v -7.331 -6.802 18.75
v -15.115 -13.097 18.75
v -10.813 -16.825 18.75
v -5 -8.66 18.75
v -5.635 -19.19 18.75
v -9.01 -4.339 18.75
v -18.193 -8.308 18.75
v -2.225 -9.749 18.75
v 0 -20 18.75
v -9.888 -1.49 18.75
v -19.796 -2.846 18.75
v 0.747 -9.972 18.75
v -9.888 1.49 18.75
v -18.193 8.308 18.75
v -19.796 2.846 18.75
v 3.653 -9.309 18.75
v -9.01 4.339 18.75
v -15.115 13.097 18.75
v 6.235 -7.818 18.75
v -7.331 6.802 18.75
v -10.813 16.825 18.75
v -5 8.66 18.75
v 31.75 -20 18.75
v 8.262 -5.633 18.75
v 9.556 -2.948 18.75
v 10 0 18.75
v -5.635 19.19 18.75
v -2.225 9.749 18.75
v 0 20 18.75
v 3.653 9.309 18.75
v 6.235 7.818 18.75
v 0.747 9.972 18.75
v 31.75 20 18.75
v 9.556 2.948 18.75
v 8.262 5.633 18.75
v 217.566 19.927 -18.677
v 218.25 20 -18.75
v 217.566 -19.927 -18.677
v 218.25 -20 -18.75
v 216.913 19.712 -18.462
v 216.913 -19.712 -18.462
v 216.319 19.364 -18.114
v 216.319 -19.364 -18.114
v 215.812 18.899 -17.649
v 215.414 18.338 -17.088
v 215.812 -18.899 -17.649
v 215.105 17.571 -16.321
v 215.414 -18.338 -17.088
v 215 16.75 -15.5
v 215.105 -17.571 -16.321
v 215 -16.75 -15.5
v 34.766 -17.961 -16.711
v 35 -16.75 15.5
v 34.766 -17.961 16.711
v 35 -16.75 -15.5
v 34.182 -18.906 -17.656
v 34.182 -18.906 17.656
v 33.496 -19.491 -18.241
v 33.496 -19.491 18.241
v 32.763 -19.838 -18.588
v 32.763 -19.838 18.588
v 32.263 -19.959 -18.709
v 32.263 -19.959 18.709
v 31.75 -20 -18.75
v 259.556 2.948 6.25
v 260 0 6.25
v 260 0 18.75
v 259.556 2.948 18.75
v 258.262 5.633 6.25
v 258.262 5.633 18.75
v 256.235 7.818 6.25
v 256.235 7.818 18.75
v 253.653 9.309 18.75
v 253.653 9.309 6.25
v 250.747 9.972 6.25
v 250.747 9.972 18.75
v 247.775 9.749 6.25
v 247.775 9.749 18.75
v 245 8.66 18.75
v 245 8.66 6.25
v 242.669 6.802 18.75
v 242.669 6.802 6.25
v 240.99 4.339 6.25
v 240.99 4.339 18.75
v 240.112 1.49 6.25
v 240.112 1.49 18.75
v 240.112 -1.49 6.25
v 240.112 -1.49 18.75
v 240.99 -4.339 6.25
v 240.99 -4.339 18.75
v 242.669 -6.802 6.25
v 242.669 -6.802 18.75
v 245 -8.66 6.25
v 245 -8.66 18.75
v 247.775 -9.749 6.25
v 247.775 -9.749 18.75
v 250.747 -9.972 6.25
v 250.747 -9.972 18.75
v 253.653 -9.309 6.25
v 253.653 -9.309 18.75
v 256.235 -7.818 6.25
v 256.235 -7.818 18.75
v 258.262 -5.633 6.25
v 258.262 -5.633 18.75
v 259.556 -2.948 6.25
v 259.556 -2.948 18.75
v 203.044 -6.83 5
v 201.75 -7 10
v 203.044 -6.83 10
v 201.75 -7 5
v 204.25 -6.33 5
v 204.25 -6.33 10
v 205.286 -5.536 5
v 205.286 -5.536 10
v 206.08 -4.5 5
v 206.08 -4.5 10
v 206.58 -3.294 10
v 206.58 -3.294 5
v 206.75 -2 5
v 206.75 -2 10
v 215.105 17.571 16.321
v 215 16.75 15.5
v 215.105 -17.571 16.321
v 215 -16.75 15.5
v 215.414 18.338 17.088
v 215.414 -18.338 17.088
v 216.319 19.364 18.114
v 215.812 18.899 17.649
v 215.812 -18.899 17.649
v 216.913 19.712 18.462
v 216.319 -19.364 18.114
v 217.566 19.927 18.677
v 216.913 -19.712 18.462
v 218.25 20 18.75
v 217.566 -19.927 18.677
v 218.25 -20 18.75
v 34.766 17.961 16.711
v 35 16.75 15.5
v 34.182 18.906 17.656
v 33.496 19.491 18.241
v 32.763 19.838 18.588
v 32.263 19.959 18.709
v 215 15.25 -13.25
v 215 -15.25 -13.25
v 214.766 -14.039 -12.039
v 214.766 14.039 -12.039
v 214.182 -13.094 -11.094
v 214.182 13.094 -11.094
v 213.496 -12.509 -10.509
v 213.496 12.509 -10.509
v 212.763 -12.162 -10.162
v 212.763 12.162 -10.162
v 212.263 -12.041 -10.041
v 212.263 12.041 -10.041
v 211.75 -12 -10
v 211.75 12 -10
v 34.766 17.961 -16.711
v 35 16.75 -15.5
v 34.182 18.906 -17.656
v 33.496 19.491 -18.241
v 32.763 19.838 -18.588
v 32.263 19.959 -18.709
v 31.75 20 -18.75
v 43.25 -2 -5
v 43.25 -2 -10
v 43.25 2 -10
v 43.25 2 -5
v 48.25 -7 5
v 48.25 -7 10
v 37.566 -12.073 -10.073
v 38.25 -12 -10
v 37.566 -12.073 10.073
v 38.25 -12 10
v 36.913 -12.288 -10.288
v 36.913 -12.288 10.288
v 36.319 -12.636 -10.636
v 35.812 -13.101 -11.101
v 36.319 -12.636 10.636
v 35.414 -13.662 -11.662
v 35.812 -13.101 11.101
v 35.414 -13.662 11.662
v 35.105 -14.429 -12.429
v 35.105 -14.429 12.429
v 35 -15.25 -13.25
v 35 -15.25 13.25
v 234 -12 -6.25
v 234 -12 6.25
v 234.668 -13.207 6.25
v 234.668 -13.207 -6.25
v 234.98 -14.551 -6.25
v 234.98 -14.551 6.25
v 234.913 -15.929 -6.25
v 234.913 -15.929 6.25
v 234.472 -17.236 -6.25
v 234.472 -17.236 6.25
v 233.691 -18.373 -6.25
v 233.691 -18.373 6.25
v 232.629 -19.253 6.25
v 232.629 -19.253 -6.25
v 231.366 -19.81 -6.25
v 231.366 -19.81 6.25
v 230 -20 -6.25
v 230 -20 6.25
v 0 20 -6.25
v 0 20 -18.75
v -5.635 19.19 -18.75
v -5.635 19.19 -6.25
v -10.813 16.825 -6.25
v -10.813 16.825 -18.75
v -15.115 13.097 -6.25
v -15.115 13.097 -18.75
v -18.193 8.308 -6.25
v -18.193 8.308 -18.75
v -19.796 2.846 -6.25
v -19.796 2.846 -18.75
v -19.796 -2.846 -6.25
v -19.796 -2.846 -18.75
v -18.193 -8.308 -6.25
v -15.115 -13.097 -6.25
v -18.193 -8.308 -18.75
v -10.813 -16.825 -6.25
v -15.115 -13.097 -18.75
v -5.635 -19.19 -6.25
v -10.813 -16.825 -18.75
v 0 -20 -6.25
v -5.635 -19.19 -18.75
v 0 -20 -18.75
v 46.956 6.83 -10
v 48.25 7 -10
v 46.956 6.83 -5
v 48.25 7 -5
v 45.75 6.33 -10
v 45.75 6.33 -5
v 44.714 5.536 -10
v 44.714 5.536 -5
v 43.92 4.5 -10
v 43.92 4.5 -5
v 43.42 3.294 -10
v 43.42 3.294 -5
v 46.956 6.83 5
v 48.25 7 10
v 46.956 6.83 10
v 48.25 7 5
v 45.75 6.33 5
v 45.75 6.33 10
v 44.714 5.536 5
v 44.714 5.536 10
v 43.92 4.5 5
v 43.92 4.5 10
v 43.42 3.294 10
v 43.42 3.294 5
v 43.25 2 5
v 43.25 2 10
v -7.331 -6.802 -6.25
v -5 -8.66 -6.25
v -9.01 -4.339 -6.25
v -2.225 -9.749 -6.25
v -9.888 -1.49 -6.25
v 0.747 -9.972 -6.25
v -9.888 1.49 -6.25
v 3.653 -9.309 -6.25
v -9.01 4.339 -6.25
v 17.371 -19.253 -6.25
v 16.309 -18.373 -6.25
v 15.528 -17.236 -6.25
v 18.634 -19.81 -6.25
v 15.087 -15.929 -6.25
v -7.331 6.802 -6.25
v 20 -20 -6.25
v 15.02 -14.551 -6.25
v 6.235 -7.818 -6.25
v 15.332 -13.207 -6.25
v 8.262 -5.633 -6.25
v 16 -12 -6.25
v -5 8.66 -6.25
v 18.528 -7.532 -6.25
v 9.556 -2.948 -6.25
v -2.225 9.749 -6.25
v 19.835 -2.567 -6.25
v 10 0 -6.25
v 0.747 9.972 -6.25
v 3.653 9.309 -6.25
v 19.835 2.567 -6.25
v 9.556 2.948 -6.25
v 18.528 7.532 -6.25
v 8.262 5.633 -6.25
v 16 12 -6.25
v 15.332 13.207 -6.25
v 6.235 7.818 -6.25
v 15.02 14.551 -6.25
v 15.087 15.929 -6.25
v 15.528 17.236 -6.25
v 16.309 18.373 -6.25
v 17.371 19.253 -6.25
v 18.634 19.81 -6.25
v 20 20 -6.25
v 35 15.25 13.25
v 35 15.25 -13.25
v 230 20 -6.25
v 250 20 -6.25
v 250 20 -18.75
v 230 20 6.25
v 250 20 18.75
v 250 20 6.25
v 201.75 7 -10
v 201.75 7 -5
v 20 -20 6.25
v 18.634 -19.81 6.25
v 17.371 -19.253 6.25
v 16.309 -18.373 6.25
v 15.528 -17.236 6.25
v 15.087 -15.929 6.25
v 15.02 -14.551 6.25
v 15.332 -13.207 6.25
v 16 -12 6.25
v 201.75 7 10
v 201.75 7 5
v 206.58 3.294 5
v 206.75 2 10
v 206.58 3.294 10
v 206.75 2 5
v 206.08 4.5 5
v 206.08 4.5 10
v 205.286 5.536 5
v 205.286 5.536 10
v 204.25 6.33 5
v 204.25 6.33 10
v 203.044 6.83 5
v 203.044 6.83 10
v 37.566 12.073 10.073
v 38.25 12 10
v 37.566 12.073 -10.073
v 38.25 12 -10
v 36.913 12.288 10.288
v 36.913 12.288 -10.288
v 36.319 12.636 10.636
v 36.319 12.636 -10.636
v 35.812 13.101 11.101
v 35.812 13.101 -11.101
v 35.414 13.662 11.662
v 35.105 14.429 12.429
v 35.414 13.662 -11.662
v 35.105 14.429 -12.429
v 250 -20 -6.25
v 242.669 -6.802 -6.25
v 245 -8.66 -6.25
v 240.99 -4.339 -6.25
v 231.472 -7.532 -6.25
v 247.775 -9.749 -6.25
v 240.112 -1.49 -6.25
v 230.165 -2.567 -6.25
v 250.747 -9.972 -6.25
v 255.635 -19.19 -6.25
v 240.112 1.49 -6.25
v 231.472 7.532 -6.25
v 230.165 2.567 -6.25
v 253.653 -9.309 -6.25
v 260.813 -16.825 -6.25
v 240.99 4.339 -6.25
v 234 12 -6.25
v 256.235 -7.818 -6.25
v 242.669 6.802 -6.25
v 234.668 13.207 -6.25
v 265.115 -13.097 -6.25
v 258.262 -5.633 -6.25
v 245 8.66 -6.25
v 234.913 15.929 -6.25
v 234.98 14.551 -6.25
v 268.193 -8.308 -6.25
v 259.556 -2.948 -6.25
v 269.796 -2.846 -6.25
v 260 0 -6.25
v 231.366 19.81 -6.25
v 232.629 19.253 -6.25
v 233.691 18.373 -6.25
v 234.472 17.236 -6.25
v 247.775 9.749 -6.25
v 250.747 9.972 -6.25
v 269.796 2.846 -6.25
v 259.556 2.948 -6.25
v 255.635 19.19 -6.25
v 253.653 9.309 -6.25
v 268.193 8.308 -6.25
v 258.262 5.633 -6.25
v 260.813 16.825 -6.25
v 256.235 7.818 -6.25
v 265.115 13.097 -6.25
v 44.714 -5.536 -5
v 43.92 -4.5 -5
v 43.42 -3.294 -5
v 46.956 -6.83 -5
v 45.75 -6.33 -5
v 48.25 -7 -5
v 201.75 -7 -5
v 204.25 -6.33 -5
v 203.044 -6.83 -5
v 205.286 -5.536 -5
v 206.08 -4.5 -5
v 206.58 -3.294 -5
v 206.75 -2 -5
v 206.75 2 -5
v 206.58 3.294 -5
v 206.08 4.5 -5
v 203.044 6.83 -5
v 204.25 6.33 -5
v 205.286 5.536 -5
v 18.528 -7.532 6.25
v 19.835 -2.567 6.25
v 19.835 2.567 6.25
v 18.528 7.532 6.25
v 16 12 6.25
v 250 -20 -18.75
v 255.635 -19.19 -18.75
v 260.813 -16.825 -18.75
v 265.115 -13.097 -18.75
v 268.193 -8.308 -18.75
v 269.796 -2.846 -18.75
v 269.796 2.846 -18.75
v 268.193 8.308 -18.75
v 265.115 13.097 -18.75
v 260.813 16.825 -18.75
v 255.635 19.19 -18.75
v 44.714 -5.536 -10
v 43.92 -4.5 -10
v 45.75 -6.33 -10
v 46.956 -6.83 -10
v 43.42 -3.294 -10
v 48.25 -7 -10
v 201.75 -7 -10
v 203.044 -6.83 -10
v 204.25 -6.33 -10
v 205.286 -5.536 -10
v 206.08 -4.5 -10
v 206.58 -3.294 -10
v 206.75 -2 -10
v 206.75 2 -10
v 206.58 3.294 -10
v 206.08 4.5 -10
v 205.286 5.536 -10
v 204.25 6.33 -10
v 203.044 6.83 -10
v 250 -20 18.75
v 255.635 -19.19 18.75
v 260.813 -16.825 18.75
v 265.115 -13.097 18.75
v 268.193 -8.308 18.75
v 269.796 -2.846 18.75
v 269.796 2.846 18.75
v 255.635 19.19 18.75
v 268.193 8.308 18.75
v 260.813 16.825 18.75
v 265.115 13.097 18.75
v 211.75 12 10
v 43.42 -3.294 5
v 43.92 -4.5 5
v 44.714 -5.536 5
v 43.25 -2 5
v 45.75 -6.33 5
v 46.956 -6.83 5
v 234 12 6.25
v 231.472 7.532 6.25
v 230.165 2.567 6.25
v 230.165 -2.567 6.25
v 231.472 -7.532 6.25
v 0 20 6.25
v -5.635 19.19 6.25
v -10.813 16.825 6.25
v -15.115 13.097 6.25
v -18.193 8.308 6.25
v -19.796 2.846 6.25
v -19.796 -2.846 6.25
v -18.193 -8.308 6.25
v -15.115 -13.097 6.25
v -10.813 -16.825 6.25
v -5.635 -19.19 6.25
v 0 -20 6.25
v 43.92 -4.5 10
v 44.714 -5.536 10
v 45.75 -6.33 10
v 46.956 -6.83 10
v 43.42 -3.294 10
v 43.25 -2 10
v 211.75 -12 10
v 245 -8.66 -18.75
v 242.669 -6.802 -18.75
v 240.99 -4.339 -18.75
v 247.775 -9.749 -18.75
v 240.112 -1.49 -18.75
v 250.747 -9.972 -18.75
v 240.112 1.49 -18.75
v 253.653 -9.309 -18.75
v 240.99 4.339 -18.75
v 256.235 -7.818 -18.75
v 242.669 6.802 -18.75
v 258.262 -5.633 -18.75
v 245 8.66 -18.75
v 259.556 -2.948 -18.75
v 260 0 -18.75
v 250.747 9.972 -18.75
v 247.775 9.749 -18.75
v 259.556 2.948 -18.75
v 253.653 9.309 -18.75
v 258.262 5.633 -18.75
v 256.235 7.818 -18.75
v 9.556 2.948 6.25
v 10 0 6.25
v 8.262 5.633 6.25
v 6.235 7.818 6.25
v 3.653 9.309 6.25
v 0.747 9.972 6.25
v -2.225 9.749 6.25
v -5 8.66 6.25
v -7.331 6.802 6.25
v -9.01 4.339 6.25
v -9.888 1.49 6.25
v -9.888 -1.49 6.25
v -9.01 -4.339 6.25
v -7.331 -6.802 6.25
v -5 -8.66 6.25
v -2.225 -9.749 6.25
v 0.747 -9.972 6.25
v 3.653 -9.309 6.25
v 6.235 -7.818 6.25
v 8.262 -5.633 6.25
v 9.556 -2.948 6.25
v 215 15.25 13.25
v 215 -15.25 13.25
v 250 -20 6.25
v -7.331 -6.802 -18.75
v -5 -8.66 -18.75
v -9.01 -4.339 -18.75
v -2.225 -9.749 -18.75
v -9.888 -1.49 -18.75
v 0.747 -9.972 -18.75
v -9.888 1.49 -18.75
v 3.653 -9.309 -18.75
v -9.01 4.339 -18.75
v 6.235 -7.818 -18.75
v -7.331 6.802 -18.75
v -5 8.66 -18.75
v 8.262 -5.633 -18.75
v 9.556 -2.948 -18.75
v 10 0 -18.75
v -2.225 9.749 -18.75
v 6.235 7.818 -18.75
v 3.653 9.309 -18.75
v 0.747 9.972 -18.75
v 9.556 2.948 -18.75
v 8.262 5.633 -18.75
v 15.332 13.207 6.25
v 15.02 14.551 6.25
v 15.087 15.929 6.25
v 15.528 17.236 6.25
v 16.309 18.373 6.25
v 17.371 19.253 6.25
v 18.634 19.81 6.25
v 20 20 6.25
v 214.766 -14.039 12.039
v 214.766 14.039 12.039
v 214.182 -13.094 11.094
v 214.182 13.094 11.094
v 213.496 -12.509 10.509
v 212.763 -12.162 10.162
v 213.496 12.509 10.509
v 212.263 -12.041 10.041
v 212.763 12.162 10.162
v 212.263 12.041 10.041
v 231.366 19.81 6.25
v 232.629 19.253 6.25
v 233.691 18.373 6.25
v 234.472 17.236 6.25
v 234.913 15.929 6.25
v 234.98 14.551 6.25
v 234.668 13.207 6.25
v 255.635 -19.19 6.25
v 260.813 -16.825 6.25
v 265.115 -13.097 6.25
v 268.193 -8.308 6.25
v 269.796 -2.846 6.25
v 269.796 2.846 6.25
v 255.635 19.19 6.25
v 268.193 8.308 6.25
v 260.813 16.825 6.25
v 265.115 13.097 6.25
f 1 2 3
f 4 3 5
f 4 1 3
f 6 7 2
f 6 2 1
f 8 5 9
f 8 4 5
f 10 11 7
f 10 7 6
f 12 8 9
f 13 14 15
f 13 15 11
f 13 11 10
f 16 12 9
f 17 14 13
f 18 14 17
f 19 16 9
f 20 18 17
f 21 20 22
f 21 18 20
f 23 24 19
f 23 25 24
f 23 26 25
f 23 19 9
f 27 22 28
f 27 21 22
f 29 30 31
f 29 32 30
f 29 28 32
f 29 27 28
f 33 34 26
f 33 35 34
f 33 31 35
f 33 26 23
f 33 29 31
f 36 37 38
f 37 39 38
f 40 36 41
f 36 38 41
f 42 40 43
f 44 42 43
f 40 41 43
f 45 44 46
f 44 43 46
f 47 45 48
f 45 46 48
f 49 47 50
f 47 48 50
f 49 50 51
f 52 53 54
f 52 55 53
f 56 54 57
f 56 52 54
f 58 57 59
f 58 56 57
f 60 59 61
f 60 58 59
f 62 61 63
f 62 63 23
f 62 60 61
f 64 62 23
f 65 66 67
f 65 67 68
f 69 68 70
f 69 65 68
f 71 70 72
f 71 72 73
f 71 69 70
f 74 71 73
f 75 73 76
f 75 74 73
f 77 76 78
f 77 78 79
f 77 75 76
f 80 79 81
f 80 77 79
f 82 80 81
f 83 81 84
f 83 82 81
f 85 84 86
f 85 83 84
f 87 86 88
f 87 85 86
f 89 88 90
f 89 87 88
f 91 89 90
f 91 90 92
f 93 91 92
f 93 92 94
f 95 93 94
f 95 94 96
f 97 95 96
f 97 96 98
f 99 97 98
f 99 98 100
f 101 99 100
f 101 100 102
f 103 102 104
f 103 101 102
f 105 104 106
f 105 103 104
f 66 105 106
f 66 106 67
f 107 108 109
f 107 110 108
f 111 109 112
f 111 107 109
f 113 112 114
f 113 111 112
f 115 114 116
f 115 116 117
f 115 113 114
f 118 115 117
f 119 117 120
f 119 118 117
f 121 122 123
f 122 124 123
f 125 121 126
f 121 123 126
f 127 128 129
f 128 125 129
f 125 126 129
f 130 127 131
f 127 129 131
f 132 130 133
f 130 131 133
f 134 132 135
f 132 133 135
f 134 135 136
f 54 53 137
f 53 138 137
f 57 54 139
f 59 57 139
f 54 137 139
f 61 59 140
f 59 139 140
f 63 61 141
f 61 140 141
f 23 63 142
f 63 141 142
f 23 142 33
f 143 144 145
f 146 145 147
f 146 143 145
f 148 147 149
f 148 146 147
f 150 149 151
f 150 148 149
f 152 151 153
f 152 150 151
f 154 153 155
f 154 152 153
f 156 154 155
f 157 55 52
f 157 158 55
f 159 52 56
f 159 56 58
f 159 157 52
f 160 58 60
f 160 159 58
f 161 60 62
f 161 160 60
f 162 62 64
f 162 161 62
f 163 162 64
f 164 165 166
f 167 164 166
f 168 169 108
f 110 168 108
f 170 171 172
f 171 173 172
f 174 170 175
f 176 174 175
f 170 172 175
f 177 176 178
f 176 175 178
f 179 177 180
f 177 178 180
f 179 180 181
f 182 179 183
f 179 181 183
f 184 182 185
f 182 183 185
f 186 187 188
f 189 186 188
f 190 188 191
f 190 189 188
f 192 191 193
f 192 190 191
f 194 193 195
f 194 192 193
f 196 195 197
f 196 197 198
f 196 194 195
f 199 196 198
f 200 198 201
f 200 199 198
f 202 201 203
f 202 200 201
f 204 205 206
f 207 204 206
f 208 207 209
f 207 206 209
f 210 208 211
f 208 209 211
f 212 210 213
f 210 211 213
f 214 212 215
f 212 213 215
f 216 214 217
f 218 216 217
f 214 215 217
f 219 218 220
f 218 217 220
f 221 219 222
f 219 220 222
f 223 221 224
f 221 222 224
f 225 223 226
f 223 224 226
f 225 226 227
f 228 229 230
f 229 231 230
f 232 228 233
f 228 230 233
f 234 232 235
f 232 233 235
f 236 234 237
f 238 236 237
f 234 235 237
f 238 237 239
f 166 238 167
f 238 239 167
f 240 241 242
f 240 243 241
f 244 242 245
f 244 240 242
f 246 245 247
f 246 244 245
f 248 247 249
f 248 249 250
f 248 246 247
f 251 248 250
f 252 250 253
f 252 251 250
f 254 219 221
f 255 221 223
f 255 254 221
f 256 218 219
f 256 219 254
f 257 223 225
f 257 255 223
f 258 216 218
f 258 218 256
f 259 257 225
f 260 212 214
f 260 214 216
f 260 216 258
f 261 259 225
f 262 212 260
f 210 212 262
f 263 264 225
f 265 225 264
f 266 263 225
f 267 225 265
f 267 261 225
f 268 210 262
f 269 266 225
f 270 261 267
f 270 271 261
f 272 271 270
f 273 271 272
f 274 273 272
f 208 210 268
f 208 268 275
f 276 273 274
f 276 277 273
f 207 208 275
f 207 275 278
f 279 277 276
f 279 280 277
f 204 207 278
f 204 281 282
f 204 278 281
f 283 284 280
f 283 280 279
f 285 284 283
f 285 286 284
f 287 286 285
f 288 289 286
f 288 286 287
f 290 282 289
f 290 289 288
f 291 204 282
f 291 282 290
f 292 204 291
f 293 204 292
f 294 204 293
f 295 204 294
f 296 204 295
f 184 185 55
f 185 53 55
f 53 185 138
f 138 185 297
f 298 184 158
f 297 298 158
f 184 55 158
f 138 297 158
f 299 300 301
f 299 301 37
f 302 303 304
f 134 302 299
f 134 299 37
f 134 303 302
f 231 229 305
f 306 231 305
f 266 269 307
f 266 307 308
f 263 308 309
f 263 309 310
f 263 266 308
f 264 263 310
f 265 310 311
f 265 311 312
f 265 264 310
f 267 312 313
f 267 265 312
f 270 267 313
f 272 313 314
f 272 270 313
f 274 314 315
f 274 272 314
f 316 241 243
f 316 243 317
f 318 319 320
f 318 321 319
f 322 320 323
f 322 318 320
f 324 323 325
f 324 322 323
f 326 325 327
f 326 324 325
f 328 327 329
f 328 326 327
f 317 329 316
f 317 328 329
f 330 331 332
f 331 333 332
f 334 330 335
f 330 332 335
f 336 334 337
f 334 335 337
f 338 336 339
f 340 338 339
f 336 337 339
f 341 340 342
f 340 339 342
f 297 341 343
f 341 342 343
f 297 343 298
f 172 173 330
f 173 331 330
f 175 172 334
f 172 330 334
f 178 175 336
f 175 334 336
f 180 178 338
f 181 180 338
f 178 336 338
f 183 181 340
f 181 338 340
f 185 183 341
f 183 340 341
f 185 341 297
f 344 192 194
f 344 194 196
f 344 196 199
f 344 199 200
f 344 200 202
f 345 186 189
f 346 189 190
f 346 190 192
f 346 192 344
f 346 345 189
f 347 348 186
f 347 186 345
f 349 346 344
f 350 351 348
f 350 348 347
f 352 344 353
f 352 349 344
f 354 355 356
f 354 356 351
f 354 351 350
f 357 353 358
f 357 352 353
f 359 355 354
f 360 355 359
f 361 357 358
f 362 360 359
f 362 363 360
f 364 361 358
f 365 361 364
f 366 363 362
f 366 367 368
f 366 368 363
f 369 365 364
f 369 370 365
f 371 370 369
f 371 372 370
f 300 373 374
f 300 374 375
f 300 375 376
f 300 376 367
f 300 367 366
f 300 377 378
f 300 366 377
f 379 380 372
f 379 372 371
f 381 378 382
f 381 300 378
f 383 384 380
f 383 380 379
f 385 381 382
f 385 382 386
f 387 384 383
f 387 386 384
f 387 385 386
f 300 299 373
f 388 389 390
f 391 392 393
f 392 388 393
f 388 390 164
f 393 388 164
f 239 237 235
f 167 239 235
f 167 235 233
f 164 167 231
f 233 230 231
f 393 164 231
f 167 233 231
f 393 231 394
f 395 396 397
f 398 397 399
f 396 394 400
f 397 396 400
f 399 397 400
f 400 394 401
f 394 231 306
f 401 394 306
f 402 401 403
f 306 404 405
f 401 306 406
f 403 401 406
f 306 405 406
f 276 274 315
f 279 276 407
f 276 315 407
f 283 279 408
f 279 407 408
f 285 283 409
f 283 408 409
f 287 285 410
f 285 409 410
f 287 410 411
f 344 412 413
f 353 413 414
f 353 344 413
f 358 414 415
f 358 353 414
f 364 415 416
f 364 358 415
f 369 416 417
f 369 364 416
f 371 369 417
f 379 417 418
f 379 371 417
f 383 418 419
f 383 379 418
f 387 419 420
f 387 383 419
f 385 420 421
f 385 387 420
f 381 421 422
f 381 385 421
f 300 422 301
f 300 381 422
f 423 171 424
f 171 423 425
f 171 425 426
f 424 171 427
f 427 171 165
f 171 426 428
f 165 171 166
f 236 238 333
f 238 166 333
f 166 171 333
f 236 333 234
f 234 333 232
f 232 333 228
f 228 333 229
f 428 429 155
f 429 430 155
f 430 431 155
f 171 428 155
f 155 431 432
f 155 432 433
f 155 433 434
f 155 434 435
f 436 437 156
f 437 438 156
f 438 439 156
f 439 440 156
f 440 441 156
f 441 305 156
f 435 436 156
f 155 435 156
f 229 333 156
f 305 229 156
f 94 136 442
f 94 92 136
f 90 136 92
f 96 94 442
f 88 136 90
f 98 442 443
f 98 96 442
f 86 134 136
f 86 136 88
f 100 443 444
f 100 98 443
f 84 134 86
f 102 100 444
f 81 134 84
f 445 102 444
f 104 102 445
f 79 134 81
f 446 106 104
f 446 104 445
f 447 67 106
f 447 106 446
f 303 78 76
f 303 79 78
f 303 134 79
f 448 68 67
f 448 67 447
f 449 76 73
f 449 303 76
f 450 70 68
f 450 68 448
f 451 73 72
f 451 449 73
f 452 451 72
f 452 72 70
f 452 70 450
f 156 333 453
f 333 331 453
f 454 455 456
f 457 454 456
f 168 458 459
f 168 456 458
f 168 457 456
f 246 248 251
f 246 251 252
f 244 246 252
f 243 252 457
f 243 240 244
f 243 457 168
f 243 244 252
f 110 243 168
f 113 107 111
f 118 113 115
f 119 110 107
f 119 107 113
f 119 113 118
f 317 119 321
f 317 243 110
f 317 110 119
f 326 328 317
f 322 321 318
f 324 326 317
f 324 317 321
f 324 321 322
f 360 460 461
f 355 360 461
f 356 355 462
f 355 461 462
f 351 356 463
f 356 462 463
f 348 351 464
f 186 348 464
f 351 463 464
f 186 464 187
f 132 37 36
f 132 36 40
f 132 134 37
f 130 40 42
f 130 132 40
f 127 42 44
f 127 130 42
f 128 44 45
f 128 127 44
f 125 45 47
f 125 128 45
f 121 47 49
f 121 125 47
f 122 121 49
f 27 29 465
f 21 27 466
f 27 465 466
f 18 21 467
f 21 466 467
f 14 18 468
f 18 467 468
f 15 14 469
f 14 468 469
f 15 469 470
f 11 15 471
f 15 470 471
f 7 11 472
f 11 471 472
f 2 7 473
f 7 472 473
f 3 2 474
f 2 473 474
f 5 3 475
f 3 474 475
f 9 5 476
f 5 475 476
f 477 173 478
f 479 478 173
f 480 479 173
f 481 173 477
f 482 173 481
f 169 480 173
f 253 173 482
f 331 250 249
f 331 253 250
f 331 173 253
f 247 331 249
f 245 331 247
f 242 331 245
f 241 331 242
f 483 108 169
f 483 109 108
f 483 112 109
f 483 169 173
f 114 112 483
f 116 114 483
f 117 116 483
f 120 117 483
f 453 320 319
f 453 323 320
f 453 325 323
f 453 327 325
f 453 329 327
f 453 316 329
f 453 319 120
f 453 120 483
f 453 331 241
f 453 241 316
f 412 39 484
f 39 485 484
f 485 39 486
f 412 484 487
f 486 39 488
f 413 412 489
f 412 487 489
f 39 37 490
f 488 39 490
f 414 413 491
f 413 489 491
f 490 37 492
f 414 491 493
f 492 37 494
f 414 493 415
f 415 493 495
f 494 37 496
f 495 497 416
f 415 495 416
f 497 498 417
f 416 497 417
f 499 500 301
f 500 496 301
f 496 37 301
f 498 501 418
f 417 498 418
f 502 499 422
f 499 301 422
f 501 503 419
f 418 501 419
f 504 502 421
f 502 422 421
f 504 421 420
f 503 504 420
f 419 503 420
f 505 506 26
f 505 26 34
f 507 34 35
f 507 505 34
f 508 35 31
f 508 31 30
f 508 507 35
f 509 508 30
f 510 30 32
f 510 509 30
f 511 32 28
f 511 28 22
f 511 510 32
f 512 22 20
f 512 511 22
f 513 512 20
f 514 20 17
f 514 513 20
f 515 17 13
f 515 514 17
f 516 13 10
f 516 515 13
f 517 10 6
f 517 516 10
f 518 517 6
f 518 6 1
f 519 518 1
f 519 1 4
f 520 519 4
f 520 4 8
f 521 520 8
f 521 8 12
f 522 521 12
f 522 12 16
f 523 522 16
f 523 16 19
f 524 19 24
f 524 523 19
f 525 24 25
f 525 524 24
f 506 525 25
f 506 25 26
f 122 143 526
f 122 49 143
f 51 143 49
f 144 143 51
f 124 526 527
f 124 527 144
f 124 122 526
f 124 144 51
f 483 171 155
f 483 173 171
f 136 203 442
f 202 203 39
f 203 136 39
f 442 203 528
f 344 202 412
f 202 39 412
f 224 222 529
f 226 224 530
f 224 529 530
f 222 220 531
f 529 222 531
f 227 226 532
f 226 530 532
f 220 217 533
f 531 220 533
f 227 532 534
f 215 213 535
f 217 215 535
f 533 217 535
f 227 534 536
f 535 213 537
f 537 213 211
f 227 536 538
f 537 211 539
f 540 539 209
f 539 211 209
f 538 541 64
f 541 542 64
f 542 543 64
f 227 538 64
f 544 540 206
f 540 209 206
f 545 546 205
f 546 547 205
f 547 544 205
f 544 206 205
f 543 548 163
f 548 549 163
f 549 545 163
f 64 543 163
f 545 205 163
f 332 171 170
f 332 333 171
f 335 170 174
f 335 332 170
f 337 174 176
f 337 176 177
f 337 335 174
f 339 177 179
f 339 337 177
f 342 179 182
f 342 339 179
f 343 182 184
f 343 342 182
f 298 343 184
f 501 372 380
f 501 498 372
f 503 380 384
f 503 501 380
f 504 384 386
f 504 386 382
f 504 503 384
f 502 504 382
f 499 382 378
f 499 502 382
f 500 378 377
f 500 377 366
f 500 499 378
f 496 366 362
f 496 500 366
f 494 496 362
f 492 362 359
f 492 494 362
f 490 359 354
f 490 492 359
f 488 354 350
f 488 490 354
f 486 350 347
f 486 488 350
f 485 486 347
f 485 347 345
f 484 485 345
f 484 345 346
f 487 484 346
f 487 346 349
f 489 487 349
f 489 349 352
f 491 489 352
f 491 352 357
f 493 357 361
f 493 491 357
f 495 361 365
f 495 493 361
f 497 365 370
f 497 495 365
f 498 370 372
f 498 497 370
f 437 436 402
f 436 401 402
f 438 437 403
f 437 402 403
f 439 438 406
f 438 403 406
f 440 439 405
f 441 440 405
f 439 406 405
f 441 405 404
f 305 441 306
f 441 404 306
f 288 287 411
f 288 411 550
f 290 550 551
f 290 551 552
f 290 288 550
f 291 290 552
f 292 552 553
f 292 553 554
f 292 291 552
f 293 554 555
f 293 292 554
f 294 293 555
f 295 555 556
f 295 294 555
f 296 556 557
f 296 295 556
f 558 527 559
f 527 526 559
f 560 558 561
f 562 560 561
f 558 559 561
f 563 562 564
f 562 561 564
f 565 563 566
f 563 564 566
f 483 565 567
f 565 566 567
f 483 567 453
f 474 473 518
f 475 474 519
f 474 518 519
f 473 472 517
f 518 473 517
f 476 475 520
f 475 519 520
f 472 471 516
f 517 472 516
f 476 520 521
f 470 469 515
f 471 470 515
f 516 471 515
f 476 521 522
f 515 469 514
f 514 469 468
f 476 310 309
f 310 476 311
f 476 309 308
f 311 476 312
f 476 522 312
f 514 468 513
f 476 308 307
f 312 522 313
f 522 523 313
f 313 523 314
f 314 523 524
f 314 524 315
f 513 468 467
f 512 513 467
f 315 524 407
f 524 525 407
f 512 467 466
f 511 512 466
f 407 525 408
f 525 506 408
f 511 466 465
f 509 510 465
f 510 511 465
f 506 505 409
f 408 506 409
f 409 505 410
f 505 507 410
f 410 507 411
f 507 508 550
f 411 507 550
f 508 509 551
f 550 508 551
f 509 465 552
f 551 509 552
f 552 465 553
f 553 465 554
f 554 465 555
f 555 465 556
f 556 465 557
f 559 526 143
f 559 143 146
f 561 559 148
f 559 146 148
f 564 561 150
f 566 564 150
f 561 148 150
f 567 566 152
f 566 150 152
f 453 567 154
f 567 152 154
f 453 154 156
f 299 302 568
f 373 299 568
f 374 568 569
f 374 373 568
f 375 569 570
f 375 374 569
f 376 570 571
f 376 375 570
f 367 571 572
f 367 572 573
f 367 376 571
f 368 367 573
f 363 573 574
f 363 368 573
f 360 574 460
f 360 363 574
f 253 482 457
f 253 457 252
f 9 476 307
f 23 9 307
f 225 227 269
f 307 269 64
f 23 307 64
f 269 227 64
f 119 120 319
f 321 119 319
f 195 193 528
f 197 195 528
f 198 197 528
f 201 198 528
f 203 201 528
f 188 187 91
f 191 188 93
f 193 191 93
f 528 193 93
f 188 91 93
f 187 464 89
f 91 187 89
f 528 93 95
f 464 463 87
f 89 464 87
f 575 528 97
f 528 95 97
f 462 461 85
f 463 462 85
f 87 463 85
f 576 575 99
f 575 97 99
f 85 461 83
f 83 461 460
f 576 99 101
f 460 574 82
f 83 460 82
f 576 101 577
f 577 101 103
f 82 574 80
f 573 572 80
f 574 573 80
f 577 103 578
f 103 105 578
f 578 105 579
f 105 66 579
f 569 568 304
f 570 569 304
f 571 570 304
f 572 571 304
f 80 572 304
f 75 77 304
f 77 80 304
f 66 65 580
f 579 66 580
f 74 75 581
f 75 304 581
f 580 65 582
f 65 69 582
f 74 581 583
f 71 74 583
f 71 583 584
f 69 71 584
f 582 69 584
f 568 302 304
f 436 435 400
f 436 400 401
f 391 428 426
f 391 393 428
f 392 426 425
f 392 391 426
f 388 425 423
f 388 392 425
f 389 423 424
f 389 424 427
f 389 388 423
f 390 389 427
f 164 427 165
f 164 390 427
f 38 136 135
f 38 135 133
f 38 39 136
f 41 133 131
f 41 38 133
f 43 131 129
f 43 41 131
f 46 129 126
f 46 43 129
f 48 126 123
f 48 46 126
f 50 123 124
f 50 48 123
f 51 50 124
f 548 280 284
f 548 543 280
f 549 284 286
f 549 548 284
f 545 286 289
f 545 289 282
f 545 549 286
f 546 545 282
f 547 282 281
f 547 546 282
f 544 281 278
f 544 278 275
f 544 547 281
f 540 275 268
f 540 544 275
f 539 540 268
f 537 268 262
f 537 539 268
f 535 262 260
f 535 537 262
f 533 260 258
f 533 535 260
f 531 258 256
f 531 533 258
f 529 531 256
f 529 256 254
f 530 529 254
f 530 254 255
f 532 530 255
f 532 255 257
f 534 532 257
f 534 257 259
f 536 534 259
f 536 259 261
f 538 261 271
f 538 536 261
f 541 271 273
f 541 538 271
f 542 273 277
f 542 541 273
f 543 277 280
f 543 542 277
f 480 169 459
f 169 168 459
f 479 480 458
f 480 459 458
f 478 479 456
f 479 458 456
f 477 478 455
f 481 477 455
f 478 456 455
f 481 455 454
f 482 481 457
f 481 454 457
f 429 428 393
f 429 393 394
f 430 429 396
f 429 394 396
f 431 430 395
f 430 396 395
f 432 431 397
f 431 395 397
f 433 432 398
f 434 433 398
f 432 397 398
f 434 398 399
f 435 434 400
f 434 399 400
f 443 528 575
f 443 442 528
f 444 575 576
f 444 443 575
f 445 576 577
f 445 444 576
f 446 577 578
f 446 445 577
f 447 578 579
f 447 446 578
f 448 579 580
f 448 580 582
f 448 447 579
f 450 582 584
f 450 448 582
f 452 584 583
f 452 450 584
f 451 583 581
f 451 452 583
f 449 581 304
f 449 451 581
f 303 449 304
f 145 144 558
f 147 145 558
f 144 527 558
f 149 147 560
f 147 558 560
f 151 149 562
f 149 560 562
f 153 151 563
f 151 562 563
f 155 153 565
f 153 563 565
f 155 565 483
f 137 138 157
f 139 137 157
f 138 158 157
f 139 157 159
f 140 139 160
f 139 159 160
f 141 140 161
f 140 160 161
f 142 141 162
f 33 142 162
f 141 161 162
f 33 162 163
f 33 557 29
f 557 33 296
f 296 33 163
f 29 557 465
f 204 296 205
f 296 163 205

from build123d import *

# Parameters (mm, degrees)
SKETCH1_W            = 180
SKETCH1_H            = 24
BOSS_EXTRUDE3_DEPTH  = 10
SKETCH1_6_R          = 20
SKETCH1_6_R_2        = 10
HEAD_WIDTH_DEPTH     = 18.75
SKETCH1_7_R          = 20
SKETCH1_7_R_2        = 10
CUT_EXTRUDE1_DEPTH   = 6.25
FILLET1_START        = -6.25
FILLET1_DEPTH        = 12.5
FILLET2_R            = 3.25
SKETCH2_W            = 163.5
SKETCH2_H            = 14
CUT_EXTRUDE2_DEPTH   = 5
FILLET3_R            = 5
FILLET3_OF_MIRROR1_R = 5


with BuildPart() as part:
    # Sketch1 → Boss-Extrude3 (new, symmetric)
    with BuildSketch(Plane.XY):
        with Locations((125, 0)):
            Rectangle(SKETCH1_W, SKETCH1_H)
    extrude(amount=BOSS_EXTRUDE3_DEPTH, both=True)

    # Sketch1<6> → Head Width (add, symmetric)
    # profile 1 of 4: a face of its own
    with BuildSketch(Plane.XY):
        with BuildLine():
            Line((35, -12), (35, 12))
            Line((35, 12), (35, 20))
            Line((35, 20), (0, 20))
            ThreePointArc((0, 20), (14.142135624, 14.142135624), (20, 0))
            ThreePointArc((20, 0), (14.142135624, -14.142135624), (0, -20))
            Line((0, -20), (35, -20))
            Line((35, -20), (35, -12))
        make_face()
    # profile 2 of 4: a face of its own
    with BuildSketch(Plane.XY):
        Circle(SKETCH1_6_R)
        Circle(SKETCH1_6_R_2, mode=Mode.SUBTRACT)
    # profile 3 of 4: a face of its own
    with BuildSketch(Plane.XY):
        with BuildLine():
            Line((215, 20), (215, 12))
            Line((215, 12), (215, -12))
            Line((215, -12), (215, -20))
            Line((215, -20), (250, -20))
            ThreePointArc((250, -20), (230, 0), (250, 20))
            Line((250, 20), (215, 20))
        make_face()
    # profile 4 of 4: a face of its own
    with BuildSketch(Plane.XY):
        with Locations((250, 0)):
            Circle(SKETCH1_6_R)
        with Locations((250, 0)):
            Circle(SKETCH1_6_R_2, mode=Mode.SUBTRACT)
    extrude(amount=HEAD_WIDTH_DEPTH, both=True)

    # Sketch1<7> → Cut-Extrude1 (cut, symmetric)
    # profile 1 of 2: a face of its own
    with BuildSketch(Plane.XY):
        Circle(SKETCH1_7_R)
        Circle(SKETCH1_7_R_2, mode=Mode.SUBTRACT)
    # profile 2 of 2: a face of its own
    with BuildSketch(Plane.XY):
        with Locations((250, 0)):
            Circle(SKETCH1_7_R)
        with Locations((250, 0)):
            Circle(SKETCH1_7_R_2, mode=Mode.SUBTRACT)
    extrude(amount=CUT_EXTRUDE1_DEPTH, both=True, mode=Mode.SUBTRACT)

    # Fillet1: read off the stored shape, not the designer's step
    # Fillet1 outline → Fillet1 (cut)
    with BuildSketch(Plane.XY.offset(FILLET1_START)):
        with BuildLine():
            ThreePointArc((230, 20), (234.472135955, 17.236067977), (234, 12))
            ThreePointArc((234, 12), (241.05572809, 17.88854382), (250, 20))
            Line((250, 20), (230, 20))
        make_face()
        with BuildLine():
            ThreePointArc((234, -12), (234.472135955, -17.236067977), (230, -20))
            Line((230, -20), (250, -20))
            ThreePointArc((250, -20), (241.05572809, -17.88854382), (234, -12))
        make_face()
        with BuildLine():
            ThreePointArc((20, -20), (15.527864045, -17.236067977), (16, -12))
            ThreePointArc((16, -12), (8.94427191, -17.88854382), (0, -20))
            Line((0, -20), (20, -20))
        make_face()
        with BuildLine():
            ThreePointArc((0, 20), (8.94427191, 17.88854382), (16, 12))
            ThreePointArc((16, 12), (15.527864045, 17.236067977), (20, 20))
            Line((20, 20), (0, 20))
        make_face()
    extrude(amount=FILLET1_DEPTH, mode=Mode.SUBTRACT)

    # Fillet2
    fillet2_edges = [part.edges().sort_by_distance(p)[0] for p in [
        (35, 0, 10),
        (35, 20, 0),
        (35, 0, 18.75),
        (35, -20, 0),
        (35, 0, -18.75),
        (215, -20, 0),
        (215, 0, -18.75),
        (215, 20, 0),
        (215, 0, 18.75),
        (215, 0, 10),
        (35, 0, -10),
        (215, 0, -10),
        (215, -12, 0),
        (35, -12, 0),
        (35, 12, 0),
        (215, 12, 0),
    ]]
    fillet(fillet2_edges, radius=FILLET2_R)

    # Sketch2 → Cut-Extrude2 (cut)
    with BuildSketch(Plane.XY.offset(10)):
        with Locations((125, 0)):
            Rectangle(SKETCH2_W, SKETCH2_H)
    cut_extrude2 = extrude(amount=-CUT_EXTRUDE2_DEPTH, mode=Mode.SUBTRACT)

    # Fillet3
    fillet3_edges = [part.edges().sort_by_distance(p)[0] for p in [
        (43.25, -7, 7.5),
        (43.25, 7, 7.5),
        (206.75, 7, 7.5),
        (206.75, -7, 7.5),
    ]]
    fillet(fillet3_edges, radius=FILLET3_R)

    # Mirror1: Cut-Extrude2 across plane
    add(cut_extrude2.mirror(Plane.XY), mode=Mode.SUBTRACT)

    # Fillet3 of Mirror1
    fillet3_of_mirror1_edges = [part.edges().sort_by_distance(p)[0] for p in [
        (43.25, -7, -7.5),
        (43.25, 7, -7.5),
        (206.75, 7, -7.5),
        (206.75, -7, -7.5),
    ]]
    fillet(fillet3_of_mirror1_edges, radius=FILLET3_OF_MIRROR1_R)


solid = part.part
